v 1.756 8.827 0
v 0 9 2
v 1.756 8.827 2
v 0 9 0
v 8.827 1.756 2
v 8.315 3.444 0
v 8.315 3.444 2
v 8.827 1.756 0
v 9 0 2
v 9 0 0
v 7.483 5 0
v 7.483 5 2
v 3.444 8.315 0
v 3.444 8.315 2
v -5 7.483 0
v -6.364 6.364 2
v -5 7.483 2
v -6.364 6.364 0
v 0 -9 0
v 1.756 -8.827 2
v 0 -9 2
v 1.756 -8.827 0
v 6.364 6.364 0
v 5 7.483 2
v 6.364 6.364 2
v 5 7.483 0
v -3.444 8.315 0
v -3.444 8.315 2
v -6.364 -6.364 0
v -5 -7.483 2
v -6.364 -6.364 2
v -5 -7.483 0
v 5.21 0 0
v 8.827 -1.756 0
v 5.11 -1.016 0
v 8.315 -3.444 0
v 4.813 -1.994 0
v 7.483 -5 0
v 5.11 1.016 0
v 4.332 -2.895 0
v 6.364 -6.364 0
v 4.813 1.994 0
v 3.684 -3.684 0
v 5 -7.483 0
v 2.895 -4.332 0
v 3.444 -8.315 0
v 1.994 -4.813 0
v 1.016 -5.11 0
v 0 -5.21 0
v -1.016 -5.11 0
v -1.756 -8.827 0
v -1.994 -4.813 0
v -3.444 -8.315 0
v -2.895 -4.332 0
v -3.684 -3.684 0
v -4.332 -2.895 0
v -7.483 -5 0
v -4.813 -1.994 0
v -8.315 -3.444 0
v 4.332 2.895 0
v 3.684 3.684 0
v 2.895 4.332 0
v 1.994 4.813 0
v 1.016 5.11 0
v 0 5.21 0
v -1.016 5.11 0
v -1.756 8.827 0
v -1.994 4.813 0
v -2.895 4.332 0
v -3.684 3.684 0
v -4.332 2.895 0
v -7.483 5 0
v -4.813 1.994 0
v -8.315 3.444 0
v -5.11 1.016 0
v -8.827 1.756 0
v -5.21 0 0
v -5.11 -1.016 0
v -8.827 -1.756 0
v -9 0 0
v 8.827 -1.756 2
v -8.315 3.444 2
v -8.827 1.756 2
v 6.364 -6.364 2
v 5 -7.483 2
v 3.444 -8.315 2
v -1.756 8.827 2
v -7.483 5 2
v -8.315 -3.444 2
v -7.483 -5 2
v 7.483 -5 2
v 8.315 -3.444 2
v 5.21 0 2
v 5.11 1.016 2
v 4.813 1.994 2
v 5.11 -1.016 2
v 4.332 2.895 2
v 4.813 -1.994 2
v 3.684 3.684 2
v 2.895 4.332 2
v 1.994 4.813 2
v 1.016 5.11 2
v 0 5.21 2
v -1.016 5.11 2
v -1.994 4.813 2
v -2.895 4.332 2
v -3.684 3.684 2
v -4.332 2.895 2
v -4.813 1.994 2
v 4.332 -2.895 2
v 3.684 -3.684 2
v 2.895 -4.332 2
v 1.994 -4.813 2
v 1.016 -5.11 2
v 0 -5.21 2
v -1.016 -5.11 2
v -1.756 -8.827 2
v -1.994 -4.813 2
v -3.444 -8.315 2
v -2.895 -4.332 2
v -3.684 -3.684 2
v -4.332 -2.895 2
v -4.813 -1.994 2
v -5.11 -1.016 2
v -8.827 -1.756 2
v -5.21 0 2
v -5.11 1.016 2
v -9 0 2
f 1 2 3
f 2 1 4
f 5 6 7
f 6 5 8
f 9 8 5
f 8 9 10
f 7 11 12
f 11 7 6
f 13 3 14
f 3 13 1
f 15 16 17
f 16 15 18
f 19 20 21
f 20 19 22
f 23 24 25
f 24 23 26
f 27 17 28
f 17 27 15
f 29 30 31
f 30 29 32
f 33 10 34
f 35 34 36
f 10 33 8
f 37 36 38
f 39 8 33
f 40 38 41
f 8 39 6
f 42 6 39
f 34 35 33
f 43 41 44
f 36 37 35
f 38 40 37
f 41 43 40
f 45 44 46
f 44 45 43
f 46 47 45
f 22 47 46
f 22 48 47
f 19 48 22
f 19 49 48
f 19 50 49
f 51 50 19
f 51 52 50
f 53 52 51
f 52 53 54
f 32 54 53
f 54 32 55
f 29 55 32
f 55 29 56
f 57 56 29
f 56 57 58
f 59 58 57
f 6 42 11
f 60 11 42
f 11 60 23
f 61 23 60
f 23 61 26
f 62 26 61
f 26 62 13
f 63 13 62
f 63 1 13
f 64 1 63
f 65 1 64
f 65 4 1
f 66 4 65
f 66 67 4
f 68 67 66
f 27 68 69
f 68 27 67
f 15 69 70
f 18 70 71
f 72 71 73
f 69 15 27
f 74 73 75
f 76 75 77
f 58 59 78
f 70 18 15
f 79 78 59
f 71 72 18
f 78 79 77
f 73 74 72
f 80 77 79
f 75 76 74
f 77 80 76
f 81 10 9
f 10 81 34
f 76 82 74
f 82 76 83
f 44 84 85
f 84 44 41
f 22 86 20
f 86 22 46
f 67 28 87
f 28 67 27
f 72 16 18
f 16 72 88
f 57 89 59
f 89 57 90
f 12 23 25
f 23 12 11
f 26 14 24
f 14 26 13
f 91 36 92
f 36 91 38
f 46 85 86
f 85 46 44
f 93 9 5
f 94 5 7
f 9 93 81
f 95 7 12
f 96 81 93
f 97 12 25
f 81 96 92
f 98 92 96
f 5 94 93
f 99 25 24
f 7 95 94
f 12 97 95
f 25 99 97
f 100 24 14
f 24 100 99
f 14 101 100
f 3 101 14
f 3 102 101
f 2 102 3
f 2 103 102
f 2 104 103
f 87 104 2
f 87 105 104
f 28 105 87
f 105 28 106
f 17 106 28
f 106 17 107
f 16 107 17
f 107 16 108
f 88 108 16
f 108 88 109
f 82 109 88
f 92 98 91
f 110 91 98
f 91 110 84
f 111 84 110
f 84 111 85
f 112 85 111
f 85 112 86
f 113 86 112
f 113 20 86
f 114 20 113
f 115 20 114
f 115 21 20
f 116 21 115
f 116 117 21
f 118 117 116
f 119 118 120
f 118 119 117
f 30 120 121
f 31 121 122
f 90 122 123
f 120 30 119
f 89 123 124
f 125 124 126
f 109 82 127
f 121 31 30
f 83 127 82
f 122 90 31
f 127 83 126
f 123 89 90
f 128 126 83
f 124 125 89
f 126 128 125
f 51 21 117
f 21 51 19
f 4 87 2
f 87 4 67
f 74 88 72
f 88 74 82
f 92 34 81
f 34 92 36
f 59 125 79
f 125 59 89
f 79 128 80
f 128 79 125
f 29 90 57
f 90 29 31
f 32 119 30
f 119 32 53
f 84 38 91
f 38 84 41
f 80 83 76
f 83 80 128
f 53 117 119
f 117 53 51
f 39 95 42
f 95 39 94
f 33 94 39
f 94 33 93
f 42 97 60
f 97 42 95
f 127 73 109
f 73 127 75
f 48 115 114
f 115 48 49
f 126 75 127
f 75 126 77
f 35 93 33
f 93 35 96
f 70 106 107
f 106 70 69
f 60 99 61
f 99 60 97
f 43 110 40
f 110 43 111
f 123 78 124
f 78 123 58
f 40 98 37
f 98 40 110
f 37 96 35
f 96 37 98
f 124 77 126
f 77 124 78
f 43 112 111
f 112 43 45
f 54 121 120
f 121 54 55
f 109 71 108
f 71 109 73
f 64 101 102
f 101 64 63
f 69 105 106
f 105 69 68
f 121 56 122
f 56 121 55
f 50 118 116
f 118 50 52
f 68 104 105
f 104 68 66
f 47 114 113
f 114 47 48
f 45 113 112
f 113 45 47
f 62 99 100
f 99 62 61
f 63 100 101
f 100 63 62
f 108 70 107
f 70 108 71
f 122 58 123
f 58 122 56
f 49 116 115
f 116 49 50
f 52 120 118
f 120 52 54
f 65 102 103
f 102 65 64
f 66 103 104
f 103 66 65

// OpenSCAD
module chainringBoltSpacer(diameter=9.9, tolerance=0.26, _fn = 32) {
  difference() {
    cylinder(r=9, h=2, $fn=_fn);
    
    translate([0,0,-0.1])
      cylinder(r=diameter * 0.5 + tolerance, h=2.2, $fn=_fn);
  }
}

chainringBoltSpacer();
